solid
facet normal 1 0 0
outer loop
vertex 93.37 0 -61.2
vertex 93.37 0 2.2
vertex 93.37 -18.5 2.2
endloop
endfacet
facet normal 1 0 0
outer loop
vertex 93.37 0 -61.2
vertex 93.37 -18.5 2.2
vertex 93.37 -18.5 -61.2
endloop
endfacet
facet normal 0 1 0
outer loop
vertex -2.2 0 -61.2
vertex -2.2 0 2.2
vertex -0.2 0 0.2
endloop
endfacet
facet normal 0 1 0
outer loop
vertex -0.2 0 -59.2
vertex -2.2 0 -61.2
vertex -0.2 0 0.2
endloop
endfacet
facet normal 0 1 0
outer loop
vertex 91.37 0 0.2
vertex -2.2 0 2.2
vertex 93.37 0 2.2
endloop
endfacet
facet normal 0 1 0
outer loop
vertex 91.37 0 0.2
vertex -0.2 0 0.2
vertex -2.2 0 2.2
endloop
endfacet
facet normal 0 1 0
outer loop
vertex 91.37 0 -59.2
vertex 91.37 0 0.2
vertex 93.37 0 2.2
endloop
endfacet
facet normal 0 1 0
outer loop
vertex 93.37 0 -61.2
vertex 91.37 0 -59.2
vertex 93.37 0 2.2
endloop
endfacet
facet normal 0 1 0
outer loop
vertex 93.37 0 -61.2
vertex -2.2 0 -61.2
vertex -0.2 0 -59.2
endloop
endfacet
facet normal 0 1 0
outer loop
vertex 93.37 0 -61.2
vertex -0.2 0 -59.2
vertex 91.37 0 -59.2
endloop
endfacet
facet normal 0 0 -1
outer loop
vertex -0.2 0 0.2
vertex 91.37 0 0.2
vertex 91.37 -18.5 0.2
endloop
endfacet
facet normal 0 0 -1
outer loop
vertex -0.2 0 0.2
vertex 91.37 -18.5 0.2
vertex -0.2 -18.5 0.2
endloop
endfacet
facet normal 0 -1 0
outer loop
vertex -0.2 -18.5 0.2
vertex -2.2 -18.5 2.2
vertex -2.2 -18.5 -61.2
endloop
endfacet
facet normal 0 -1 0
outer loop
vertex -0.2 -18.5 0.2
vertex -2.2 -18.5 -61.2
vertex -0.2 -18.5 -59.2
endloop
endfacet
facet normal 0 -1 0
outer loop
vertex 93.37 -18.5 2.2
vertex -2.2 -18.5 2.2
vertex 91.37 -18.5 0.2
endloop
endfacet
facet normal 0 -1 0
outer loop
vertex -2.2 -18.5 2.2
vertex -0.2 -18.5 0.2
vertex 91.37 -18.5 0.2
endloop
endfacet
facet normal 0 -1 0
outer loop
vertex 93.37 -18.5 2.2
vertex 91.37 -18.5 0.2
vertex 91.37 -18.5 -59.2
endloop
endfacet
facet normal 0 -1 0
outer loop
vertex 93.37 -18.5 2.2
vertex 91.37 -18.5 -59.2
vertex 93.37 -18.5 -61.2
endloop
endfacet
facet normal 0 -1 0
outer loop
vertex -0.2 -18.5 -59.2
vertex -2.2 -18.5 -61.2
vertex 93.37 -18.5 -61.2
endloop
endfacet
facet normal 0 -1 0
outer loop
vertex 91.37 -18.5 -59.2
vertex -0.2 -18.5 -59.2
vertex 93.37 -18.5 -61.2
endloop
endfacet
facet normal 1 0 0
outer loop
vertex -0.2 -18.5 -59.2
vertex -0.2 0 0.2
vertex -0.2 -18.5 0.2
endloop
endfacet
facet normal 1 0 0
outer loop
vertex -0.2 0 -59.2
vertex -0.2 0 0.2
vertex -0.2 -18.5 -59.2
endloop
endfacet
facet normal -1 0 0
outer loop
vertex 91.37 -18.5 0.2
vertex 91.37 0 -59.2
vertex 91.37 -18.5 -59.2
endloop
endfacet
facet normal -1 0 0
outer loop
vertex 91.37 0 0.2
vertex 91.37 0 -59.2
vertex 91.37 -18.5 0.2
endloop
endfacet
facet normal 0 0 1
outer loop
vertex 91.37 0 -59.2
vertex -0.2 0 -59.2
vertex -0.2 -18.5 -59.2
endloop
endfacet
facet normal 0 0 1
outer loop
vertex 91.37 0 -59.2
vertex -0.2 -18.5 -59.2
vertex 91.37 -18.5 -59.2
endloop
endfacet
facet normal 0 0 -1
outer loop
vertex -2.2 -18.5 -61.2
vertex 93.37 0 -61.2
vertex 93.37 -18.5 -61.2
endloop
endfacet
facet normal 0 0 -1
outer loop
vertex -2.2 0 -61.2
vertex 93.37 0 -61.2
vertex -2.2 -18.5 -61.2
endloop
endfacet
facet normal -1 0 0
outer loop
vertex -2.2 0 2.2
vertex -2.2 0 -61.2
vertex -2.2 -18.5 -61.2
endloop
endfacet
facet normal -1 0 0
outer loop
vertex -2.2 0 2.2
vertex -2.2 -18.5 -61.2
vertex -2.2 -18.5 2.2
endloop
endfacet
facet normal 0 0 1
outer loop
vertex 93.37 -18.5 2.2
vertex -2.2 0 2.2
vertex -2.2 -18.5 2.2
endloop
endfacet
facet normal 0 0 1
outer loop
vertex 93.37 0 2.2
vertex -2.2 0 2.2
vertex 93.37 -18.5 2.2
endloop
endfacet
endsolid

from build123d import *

# Parameters (mm, degrees)
SKETCH_2_W      = 2
SKETCH_2_H      = 10.4
SKETCH_2_H_2    = 18.3
SKETCH_2_H_3    = 13
EXTRUDE_1_DEPTH = 18.5


with BuildPart() as part:
    # 草图2 → 凸台-拉伸1 (new body)
    with BuildSketch(Plane(origin=(0, 0, 0), x_dir=(1, 0, 0), z_dir=(0, 1, 0))):
        Polygon((-0.2, 4.564103951), (-0.2, 5.3), (-2.2, 5.3), (-2.2, -2.2), (76.17, -2.2), (76.17, -0.2), (74.17, -0.2), (16.8, -0.2), (-0.2, -0.2), align=None)
        with Locations((-1.2, 10.5)):
            Rectangle(SKETCH_2_W, SKETCH_2_H)
        with Locations((-1.2, 24.85)):
            Rectangle(SKETCH_2_W, SKETCH_2_H_2)
        with Locations((-1.2, 40.5)):
            Rectangle(SKETCH_2_W, SKETCH_2_H_3)
        Polygon((-0.2, 50.2), (-0.2, 59.2), (13.8, 59.2), (16.8, 59.2), (74.17, 59.2), (76.17, 59.2), (91.37, 59.2), (91.37, -0.2), (76.17, -0.2), (76.17, -2.2), (93.37, -2.2), (93.37, 61.2), (-2.2, 61.2), (-2.2, 47), (-0.2, 47), align=None)
    extrude(amount=-EXTRUDE_1_DEPTH)


solid = part.part
